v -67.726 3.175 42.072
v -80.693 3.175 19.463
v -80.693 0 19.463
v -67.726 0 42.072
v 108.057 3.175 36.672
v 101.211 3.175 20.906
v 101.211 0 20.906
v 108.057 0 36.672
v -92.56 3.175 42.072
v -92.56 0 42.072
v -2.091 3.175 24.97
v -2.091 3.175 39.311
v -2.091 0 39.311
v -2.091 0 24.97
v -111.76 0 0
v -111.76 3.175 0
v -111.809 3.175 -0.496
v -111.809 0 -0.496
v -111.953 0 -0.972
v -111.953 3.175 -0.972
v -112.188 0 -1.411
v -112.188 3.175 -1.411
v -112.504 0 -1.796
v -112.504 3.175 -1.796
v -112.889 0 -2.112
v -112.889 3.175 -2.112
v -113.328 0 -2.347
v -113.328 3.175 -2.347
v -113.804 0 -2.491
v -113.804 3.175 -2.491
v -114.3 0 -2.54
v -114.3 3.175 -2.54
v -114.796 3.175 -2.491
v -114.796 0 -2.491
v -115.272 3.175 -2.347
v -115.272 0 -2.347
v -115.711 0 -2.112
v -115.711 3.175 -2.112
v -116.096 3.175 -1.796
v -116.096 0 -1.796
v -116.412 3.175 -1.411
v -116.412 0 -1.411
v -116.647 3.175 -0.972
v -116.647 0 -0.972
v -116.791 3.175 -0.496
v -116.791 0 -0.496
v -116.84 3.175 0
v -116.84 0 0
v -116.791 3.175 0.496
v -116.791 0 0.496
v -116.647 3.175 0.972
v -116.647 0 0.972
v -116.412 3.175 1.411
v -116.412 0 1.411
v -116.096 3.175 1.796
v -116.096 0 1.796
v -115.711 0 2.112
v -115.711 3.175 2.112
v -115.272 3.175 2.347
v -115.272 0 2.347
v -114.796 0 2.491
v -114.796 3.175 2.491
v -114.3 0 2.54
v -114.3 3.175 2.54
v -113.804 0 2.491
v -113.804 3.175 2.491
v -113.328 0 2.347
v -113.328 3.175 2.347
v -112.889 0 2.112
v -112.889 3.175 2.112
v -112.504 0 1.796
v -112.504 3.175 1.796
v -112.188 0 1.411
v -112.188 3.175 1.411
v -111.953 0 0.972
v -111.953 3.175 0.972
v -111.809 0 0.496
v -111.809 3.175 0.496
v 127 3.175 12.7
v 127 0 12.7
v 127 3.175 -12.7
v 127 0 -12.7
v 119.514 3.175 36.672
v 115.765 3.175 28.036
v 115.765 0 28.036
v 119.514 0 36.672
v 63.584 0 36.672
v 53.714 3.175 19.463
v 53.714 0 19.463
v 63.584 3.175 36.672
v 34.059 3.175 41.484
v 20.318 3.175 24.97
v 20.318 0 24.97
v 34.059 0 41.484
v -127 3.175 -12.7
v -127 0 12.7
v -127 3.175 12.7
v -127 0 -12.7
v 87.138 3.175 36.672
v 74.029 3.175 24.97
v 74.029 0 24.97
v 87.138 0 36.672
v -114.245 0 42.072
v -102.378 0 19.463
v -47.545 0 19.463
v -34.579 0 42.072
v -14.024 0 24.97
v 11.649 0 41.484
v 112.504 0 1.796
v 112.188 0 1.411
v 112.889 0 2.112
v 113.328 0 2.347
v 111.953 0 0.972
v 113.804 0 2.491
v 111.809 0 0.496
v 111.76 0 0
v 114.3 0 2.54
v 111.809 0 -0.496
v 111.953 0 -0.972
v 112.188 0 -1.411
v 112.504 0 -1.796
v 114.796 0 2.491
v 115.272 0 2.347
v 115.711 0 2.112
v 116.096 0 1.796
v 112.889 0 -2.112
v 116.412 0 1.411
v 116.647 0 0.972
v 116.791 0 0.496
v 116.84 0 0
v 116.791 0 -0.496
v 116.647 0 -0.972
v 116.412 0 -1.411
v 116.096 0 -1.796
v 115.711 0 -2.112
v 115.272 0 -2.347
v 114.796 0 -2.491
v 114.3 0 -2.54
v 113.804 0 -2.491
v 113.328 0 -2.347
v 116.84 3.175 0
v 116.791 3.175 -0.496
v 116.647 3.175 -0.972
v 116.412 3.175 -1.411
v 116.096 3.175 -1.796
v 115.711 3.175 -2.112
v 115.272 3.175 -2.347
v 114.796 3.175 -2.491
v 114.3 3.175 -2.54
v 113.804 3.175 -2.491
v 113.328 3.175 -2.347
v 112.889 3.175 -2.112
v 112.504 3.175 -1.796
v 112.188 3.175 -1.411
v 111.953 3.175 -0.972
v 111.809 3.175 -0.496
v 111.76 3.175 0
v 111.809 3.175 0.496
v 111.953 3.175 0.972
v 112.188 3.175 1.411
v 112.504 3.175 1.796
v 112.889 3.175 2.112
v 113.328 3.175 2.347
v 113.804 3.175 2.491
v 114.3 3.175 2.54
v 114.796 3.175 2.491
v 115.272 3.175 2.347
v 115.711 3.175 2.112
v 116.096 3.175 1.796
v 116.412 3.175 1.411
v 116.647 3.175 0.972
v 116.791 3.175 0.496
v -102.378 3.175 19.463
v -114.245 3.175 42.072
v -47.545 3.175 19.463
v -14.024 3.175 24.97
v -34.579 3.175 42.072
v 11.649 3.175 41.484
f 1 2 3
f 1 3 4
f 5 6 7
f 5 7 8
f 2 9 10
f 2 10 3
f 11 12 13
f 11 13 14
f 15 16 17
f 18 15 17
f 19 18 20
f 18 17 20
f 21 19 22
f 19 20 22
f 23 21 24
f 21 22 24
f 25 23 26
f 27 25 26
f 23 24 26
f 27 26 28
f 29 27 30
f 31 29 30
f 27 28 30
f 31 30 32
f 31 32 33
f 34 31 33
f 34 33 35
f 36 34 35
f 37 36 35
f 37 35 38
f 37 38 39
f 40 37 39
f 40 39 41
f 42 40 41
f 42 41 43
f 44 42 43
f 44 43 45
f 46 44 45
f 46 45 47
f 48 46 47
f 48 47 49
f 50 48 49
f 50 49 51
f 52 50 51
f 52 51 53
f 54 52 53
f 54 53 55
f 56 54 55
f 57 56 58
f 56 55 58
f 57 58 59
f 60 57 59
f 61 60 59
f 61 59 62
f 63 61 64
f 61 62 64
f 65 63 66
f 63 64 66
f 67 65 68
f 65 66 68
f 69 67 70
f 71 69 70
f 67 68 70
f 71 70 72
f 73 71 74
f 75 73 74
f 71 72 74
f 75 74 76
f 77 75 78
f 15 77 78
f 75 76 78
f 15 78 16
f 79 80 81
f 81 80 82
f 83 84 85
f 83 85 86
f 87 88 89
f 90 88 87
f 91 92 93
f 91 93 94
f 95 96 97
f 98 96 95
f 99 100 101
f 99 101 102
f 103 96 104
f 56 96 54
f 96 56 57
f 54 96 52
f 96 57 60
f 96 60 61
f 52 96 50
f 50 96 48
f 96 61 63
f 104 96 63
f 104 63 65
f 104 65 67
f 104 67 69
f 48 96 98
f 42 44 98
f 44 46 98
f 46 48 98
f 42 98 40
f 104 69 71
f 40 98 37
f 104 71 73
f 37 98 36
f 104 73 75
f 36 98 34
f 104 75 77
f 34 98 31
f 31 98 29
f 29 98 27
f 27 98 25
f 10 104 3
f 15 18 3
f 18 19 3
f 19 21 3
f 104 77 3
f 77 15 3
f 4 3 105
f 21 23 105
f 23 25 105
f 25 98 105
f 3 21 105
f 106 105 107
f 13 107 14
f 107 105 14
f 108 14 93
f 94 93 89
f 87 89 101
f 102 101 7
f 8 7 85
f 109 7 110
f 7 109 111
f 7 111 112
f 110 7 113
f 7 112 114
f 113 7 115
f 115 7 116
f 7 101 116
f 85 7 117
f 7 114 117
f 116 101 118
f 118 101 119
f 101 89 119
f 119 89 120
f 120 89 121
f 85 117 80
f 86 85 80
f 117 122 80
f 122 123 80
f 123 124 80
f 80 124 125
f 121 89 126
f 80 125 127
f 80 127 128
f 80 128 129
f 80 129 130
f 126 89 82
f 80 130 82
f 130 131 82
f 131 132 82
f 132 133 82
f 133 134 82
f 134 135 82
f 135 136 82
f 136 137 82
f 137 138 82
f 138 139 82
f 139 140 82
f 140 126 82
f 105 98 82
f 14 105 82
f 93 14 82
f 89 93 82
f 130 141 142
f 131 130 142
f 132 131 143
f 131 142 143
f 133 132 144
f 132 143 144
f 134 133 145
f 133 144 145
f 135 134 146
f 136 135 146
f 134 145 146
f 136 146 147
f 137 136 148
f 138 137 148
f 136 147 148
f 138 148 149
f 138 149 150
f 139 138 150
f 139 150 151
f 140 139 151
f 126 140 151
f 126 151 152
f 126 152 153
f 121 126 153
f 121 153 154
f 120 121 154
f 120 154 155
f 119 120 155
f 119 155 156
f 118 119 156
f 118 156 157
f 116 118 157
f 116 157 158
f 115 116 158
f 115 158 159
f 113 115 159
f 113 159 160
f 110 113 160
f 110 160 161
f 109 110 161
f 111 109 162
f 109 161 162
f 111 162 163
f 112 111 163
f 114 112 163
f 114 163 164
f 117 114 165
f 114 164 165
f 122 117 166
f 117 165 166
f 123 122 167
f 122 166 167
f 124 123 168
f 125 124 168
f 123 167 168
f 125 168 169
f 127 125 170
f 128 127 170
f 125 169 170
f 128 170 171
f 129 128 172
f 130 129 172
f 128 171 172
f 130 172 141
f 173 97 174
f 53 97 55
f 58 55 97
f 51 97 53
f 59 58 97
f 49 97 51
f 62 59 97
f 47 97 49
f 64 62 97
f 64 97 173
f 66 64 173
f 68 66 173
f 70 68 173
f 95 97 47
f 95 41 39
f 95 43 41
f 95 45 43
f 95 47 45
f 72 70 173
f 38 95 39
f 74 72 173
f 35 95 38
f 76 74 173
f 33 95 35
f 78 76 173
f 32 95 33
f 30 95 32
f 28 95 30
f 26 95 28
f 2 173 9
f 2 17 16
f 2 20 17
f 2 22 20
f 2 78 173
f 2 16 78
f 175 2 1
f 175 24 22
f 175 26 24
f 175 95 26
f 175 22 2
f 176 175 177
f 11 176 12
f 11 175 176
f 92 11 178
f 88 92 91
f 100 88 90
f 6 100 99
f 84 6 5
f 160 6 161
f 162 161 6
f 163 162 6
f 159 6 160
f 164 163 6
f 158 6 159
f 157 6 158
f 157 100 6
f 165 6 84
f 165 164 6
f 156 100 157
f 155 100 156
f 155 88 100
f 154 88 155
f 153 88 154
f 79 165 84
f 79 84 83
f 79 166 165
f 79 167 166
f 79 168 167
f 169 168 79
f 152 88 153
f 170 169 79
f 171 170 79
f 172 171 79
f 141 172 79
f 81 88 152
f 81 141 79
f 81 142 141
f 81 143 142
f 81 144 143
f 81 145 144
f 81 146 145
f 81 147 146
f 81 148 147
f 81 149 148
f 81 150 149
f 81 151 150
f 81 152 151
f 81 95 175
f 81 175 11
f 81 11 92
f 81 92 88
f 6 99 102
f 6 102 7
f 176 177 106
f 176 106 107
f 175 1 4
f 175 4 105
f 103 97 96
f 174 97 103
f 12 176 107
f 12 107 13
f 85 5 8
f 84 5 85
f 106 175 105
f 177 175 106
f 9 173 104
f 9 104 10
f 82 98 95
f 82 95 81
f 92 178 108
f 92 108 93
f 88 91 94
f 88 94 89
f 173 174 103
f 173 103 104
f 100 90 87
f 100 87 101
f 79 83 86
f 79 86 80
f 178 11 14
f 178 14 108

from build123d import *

# Parameters (mm, degrees)
SKETCH1_W           = 254
SKETCH1_H           = 25.4
BOSS_EXTRUDE1_DEPTH = 3.175
BOSS_EXTRUDE2_DEPTH = 3.175
SKETCH3_R           = 2.54
CUT_EXTRUDE2_DEPTH  = 4.175


with BuildPart() as part:
    # Sketch1 → Boss-Extrude1 (new body)
    with BuildSketch(Plane(origin=(0, 0, 0), x_dir=(1, 0, 0), z_dir=(0, 1, 0))):
        Rectangle(SKETCH1_W, SKETCH1_H)
    extrude(amount=BOSS_EXTRUDE1_DEPTH)

    # Sketch2 → Boss-Extrude2 (add)
    with BuildSketch(Plane(origin=(0, 3.175, 0), x_dir=(1, 0, 0), z_dir=(0, 1, 0))):
        Polygon((-127, -12.7), (-114.24505896, -42.072282192), (-102.377802862, -19.463351482), (-92.559853535, -42.072282192), (-80.692597436, -19.463351482), (-67.726112797, -42.072282192), (-47.545099388, -19.463351482), (-34.578614749, -42.072282192), (-14.024094064, -24.969728455), (-2.091376305, -39.310937246), (-2.091376305, -24.969728455), (11.649477697, -41.484026388), (20.317707317, -24.969728455), (34.058561319, -41.484026388), (53.714490264, -19.463351482), (63.583568446, -36.671508588), (74.028723274, -24.969728455), (87.13830954, -36.671508588), (101.210719192, -20.906089464), (108.056867206, -36.671508588), (115.76466778, -28.036405605), (119.514469334, -36.671508588), (127, -12.7), align=None)
    extrude(amount=-BOSS_EXTRUDE2_DEPTH)

    # Sketch3 → Cut-Extrude2 (cut, through all)
    with BuildSketch(Plane(origin=(0, 3.175, 0), x_dir=(1, 0, 0), z_dir=(0, 1, 0))):
        with Locations((-114.3, 0)):
            Circle(SKETCH3_R)
        with Locations((114.3, 0)):
            Circle(SKETCH3_R)
    extrude(amount=-CUT_EXTRUDE2_DEPTH, mode=Mode.SUBTRACT)


solid = part.part
